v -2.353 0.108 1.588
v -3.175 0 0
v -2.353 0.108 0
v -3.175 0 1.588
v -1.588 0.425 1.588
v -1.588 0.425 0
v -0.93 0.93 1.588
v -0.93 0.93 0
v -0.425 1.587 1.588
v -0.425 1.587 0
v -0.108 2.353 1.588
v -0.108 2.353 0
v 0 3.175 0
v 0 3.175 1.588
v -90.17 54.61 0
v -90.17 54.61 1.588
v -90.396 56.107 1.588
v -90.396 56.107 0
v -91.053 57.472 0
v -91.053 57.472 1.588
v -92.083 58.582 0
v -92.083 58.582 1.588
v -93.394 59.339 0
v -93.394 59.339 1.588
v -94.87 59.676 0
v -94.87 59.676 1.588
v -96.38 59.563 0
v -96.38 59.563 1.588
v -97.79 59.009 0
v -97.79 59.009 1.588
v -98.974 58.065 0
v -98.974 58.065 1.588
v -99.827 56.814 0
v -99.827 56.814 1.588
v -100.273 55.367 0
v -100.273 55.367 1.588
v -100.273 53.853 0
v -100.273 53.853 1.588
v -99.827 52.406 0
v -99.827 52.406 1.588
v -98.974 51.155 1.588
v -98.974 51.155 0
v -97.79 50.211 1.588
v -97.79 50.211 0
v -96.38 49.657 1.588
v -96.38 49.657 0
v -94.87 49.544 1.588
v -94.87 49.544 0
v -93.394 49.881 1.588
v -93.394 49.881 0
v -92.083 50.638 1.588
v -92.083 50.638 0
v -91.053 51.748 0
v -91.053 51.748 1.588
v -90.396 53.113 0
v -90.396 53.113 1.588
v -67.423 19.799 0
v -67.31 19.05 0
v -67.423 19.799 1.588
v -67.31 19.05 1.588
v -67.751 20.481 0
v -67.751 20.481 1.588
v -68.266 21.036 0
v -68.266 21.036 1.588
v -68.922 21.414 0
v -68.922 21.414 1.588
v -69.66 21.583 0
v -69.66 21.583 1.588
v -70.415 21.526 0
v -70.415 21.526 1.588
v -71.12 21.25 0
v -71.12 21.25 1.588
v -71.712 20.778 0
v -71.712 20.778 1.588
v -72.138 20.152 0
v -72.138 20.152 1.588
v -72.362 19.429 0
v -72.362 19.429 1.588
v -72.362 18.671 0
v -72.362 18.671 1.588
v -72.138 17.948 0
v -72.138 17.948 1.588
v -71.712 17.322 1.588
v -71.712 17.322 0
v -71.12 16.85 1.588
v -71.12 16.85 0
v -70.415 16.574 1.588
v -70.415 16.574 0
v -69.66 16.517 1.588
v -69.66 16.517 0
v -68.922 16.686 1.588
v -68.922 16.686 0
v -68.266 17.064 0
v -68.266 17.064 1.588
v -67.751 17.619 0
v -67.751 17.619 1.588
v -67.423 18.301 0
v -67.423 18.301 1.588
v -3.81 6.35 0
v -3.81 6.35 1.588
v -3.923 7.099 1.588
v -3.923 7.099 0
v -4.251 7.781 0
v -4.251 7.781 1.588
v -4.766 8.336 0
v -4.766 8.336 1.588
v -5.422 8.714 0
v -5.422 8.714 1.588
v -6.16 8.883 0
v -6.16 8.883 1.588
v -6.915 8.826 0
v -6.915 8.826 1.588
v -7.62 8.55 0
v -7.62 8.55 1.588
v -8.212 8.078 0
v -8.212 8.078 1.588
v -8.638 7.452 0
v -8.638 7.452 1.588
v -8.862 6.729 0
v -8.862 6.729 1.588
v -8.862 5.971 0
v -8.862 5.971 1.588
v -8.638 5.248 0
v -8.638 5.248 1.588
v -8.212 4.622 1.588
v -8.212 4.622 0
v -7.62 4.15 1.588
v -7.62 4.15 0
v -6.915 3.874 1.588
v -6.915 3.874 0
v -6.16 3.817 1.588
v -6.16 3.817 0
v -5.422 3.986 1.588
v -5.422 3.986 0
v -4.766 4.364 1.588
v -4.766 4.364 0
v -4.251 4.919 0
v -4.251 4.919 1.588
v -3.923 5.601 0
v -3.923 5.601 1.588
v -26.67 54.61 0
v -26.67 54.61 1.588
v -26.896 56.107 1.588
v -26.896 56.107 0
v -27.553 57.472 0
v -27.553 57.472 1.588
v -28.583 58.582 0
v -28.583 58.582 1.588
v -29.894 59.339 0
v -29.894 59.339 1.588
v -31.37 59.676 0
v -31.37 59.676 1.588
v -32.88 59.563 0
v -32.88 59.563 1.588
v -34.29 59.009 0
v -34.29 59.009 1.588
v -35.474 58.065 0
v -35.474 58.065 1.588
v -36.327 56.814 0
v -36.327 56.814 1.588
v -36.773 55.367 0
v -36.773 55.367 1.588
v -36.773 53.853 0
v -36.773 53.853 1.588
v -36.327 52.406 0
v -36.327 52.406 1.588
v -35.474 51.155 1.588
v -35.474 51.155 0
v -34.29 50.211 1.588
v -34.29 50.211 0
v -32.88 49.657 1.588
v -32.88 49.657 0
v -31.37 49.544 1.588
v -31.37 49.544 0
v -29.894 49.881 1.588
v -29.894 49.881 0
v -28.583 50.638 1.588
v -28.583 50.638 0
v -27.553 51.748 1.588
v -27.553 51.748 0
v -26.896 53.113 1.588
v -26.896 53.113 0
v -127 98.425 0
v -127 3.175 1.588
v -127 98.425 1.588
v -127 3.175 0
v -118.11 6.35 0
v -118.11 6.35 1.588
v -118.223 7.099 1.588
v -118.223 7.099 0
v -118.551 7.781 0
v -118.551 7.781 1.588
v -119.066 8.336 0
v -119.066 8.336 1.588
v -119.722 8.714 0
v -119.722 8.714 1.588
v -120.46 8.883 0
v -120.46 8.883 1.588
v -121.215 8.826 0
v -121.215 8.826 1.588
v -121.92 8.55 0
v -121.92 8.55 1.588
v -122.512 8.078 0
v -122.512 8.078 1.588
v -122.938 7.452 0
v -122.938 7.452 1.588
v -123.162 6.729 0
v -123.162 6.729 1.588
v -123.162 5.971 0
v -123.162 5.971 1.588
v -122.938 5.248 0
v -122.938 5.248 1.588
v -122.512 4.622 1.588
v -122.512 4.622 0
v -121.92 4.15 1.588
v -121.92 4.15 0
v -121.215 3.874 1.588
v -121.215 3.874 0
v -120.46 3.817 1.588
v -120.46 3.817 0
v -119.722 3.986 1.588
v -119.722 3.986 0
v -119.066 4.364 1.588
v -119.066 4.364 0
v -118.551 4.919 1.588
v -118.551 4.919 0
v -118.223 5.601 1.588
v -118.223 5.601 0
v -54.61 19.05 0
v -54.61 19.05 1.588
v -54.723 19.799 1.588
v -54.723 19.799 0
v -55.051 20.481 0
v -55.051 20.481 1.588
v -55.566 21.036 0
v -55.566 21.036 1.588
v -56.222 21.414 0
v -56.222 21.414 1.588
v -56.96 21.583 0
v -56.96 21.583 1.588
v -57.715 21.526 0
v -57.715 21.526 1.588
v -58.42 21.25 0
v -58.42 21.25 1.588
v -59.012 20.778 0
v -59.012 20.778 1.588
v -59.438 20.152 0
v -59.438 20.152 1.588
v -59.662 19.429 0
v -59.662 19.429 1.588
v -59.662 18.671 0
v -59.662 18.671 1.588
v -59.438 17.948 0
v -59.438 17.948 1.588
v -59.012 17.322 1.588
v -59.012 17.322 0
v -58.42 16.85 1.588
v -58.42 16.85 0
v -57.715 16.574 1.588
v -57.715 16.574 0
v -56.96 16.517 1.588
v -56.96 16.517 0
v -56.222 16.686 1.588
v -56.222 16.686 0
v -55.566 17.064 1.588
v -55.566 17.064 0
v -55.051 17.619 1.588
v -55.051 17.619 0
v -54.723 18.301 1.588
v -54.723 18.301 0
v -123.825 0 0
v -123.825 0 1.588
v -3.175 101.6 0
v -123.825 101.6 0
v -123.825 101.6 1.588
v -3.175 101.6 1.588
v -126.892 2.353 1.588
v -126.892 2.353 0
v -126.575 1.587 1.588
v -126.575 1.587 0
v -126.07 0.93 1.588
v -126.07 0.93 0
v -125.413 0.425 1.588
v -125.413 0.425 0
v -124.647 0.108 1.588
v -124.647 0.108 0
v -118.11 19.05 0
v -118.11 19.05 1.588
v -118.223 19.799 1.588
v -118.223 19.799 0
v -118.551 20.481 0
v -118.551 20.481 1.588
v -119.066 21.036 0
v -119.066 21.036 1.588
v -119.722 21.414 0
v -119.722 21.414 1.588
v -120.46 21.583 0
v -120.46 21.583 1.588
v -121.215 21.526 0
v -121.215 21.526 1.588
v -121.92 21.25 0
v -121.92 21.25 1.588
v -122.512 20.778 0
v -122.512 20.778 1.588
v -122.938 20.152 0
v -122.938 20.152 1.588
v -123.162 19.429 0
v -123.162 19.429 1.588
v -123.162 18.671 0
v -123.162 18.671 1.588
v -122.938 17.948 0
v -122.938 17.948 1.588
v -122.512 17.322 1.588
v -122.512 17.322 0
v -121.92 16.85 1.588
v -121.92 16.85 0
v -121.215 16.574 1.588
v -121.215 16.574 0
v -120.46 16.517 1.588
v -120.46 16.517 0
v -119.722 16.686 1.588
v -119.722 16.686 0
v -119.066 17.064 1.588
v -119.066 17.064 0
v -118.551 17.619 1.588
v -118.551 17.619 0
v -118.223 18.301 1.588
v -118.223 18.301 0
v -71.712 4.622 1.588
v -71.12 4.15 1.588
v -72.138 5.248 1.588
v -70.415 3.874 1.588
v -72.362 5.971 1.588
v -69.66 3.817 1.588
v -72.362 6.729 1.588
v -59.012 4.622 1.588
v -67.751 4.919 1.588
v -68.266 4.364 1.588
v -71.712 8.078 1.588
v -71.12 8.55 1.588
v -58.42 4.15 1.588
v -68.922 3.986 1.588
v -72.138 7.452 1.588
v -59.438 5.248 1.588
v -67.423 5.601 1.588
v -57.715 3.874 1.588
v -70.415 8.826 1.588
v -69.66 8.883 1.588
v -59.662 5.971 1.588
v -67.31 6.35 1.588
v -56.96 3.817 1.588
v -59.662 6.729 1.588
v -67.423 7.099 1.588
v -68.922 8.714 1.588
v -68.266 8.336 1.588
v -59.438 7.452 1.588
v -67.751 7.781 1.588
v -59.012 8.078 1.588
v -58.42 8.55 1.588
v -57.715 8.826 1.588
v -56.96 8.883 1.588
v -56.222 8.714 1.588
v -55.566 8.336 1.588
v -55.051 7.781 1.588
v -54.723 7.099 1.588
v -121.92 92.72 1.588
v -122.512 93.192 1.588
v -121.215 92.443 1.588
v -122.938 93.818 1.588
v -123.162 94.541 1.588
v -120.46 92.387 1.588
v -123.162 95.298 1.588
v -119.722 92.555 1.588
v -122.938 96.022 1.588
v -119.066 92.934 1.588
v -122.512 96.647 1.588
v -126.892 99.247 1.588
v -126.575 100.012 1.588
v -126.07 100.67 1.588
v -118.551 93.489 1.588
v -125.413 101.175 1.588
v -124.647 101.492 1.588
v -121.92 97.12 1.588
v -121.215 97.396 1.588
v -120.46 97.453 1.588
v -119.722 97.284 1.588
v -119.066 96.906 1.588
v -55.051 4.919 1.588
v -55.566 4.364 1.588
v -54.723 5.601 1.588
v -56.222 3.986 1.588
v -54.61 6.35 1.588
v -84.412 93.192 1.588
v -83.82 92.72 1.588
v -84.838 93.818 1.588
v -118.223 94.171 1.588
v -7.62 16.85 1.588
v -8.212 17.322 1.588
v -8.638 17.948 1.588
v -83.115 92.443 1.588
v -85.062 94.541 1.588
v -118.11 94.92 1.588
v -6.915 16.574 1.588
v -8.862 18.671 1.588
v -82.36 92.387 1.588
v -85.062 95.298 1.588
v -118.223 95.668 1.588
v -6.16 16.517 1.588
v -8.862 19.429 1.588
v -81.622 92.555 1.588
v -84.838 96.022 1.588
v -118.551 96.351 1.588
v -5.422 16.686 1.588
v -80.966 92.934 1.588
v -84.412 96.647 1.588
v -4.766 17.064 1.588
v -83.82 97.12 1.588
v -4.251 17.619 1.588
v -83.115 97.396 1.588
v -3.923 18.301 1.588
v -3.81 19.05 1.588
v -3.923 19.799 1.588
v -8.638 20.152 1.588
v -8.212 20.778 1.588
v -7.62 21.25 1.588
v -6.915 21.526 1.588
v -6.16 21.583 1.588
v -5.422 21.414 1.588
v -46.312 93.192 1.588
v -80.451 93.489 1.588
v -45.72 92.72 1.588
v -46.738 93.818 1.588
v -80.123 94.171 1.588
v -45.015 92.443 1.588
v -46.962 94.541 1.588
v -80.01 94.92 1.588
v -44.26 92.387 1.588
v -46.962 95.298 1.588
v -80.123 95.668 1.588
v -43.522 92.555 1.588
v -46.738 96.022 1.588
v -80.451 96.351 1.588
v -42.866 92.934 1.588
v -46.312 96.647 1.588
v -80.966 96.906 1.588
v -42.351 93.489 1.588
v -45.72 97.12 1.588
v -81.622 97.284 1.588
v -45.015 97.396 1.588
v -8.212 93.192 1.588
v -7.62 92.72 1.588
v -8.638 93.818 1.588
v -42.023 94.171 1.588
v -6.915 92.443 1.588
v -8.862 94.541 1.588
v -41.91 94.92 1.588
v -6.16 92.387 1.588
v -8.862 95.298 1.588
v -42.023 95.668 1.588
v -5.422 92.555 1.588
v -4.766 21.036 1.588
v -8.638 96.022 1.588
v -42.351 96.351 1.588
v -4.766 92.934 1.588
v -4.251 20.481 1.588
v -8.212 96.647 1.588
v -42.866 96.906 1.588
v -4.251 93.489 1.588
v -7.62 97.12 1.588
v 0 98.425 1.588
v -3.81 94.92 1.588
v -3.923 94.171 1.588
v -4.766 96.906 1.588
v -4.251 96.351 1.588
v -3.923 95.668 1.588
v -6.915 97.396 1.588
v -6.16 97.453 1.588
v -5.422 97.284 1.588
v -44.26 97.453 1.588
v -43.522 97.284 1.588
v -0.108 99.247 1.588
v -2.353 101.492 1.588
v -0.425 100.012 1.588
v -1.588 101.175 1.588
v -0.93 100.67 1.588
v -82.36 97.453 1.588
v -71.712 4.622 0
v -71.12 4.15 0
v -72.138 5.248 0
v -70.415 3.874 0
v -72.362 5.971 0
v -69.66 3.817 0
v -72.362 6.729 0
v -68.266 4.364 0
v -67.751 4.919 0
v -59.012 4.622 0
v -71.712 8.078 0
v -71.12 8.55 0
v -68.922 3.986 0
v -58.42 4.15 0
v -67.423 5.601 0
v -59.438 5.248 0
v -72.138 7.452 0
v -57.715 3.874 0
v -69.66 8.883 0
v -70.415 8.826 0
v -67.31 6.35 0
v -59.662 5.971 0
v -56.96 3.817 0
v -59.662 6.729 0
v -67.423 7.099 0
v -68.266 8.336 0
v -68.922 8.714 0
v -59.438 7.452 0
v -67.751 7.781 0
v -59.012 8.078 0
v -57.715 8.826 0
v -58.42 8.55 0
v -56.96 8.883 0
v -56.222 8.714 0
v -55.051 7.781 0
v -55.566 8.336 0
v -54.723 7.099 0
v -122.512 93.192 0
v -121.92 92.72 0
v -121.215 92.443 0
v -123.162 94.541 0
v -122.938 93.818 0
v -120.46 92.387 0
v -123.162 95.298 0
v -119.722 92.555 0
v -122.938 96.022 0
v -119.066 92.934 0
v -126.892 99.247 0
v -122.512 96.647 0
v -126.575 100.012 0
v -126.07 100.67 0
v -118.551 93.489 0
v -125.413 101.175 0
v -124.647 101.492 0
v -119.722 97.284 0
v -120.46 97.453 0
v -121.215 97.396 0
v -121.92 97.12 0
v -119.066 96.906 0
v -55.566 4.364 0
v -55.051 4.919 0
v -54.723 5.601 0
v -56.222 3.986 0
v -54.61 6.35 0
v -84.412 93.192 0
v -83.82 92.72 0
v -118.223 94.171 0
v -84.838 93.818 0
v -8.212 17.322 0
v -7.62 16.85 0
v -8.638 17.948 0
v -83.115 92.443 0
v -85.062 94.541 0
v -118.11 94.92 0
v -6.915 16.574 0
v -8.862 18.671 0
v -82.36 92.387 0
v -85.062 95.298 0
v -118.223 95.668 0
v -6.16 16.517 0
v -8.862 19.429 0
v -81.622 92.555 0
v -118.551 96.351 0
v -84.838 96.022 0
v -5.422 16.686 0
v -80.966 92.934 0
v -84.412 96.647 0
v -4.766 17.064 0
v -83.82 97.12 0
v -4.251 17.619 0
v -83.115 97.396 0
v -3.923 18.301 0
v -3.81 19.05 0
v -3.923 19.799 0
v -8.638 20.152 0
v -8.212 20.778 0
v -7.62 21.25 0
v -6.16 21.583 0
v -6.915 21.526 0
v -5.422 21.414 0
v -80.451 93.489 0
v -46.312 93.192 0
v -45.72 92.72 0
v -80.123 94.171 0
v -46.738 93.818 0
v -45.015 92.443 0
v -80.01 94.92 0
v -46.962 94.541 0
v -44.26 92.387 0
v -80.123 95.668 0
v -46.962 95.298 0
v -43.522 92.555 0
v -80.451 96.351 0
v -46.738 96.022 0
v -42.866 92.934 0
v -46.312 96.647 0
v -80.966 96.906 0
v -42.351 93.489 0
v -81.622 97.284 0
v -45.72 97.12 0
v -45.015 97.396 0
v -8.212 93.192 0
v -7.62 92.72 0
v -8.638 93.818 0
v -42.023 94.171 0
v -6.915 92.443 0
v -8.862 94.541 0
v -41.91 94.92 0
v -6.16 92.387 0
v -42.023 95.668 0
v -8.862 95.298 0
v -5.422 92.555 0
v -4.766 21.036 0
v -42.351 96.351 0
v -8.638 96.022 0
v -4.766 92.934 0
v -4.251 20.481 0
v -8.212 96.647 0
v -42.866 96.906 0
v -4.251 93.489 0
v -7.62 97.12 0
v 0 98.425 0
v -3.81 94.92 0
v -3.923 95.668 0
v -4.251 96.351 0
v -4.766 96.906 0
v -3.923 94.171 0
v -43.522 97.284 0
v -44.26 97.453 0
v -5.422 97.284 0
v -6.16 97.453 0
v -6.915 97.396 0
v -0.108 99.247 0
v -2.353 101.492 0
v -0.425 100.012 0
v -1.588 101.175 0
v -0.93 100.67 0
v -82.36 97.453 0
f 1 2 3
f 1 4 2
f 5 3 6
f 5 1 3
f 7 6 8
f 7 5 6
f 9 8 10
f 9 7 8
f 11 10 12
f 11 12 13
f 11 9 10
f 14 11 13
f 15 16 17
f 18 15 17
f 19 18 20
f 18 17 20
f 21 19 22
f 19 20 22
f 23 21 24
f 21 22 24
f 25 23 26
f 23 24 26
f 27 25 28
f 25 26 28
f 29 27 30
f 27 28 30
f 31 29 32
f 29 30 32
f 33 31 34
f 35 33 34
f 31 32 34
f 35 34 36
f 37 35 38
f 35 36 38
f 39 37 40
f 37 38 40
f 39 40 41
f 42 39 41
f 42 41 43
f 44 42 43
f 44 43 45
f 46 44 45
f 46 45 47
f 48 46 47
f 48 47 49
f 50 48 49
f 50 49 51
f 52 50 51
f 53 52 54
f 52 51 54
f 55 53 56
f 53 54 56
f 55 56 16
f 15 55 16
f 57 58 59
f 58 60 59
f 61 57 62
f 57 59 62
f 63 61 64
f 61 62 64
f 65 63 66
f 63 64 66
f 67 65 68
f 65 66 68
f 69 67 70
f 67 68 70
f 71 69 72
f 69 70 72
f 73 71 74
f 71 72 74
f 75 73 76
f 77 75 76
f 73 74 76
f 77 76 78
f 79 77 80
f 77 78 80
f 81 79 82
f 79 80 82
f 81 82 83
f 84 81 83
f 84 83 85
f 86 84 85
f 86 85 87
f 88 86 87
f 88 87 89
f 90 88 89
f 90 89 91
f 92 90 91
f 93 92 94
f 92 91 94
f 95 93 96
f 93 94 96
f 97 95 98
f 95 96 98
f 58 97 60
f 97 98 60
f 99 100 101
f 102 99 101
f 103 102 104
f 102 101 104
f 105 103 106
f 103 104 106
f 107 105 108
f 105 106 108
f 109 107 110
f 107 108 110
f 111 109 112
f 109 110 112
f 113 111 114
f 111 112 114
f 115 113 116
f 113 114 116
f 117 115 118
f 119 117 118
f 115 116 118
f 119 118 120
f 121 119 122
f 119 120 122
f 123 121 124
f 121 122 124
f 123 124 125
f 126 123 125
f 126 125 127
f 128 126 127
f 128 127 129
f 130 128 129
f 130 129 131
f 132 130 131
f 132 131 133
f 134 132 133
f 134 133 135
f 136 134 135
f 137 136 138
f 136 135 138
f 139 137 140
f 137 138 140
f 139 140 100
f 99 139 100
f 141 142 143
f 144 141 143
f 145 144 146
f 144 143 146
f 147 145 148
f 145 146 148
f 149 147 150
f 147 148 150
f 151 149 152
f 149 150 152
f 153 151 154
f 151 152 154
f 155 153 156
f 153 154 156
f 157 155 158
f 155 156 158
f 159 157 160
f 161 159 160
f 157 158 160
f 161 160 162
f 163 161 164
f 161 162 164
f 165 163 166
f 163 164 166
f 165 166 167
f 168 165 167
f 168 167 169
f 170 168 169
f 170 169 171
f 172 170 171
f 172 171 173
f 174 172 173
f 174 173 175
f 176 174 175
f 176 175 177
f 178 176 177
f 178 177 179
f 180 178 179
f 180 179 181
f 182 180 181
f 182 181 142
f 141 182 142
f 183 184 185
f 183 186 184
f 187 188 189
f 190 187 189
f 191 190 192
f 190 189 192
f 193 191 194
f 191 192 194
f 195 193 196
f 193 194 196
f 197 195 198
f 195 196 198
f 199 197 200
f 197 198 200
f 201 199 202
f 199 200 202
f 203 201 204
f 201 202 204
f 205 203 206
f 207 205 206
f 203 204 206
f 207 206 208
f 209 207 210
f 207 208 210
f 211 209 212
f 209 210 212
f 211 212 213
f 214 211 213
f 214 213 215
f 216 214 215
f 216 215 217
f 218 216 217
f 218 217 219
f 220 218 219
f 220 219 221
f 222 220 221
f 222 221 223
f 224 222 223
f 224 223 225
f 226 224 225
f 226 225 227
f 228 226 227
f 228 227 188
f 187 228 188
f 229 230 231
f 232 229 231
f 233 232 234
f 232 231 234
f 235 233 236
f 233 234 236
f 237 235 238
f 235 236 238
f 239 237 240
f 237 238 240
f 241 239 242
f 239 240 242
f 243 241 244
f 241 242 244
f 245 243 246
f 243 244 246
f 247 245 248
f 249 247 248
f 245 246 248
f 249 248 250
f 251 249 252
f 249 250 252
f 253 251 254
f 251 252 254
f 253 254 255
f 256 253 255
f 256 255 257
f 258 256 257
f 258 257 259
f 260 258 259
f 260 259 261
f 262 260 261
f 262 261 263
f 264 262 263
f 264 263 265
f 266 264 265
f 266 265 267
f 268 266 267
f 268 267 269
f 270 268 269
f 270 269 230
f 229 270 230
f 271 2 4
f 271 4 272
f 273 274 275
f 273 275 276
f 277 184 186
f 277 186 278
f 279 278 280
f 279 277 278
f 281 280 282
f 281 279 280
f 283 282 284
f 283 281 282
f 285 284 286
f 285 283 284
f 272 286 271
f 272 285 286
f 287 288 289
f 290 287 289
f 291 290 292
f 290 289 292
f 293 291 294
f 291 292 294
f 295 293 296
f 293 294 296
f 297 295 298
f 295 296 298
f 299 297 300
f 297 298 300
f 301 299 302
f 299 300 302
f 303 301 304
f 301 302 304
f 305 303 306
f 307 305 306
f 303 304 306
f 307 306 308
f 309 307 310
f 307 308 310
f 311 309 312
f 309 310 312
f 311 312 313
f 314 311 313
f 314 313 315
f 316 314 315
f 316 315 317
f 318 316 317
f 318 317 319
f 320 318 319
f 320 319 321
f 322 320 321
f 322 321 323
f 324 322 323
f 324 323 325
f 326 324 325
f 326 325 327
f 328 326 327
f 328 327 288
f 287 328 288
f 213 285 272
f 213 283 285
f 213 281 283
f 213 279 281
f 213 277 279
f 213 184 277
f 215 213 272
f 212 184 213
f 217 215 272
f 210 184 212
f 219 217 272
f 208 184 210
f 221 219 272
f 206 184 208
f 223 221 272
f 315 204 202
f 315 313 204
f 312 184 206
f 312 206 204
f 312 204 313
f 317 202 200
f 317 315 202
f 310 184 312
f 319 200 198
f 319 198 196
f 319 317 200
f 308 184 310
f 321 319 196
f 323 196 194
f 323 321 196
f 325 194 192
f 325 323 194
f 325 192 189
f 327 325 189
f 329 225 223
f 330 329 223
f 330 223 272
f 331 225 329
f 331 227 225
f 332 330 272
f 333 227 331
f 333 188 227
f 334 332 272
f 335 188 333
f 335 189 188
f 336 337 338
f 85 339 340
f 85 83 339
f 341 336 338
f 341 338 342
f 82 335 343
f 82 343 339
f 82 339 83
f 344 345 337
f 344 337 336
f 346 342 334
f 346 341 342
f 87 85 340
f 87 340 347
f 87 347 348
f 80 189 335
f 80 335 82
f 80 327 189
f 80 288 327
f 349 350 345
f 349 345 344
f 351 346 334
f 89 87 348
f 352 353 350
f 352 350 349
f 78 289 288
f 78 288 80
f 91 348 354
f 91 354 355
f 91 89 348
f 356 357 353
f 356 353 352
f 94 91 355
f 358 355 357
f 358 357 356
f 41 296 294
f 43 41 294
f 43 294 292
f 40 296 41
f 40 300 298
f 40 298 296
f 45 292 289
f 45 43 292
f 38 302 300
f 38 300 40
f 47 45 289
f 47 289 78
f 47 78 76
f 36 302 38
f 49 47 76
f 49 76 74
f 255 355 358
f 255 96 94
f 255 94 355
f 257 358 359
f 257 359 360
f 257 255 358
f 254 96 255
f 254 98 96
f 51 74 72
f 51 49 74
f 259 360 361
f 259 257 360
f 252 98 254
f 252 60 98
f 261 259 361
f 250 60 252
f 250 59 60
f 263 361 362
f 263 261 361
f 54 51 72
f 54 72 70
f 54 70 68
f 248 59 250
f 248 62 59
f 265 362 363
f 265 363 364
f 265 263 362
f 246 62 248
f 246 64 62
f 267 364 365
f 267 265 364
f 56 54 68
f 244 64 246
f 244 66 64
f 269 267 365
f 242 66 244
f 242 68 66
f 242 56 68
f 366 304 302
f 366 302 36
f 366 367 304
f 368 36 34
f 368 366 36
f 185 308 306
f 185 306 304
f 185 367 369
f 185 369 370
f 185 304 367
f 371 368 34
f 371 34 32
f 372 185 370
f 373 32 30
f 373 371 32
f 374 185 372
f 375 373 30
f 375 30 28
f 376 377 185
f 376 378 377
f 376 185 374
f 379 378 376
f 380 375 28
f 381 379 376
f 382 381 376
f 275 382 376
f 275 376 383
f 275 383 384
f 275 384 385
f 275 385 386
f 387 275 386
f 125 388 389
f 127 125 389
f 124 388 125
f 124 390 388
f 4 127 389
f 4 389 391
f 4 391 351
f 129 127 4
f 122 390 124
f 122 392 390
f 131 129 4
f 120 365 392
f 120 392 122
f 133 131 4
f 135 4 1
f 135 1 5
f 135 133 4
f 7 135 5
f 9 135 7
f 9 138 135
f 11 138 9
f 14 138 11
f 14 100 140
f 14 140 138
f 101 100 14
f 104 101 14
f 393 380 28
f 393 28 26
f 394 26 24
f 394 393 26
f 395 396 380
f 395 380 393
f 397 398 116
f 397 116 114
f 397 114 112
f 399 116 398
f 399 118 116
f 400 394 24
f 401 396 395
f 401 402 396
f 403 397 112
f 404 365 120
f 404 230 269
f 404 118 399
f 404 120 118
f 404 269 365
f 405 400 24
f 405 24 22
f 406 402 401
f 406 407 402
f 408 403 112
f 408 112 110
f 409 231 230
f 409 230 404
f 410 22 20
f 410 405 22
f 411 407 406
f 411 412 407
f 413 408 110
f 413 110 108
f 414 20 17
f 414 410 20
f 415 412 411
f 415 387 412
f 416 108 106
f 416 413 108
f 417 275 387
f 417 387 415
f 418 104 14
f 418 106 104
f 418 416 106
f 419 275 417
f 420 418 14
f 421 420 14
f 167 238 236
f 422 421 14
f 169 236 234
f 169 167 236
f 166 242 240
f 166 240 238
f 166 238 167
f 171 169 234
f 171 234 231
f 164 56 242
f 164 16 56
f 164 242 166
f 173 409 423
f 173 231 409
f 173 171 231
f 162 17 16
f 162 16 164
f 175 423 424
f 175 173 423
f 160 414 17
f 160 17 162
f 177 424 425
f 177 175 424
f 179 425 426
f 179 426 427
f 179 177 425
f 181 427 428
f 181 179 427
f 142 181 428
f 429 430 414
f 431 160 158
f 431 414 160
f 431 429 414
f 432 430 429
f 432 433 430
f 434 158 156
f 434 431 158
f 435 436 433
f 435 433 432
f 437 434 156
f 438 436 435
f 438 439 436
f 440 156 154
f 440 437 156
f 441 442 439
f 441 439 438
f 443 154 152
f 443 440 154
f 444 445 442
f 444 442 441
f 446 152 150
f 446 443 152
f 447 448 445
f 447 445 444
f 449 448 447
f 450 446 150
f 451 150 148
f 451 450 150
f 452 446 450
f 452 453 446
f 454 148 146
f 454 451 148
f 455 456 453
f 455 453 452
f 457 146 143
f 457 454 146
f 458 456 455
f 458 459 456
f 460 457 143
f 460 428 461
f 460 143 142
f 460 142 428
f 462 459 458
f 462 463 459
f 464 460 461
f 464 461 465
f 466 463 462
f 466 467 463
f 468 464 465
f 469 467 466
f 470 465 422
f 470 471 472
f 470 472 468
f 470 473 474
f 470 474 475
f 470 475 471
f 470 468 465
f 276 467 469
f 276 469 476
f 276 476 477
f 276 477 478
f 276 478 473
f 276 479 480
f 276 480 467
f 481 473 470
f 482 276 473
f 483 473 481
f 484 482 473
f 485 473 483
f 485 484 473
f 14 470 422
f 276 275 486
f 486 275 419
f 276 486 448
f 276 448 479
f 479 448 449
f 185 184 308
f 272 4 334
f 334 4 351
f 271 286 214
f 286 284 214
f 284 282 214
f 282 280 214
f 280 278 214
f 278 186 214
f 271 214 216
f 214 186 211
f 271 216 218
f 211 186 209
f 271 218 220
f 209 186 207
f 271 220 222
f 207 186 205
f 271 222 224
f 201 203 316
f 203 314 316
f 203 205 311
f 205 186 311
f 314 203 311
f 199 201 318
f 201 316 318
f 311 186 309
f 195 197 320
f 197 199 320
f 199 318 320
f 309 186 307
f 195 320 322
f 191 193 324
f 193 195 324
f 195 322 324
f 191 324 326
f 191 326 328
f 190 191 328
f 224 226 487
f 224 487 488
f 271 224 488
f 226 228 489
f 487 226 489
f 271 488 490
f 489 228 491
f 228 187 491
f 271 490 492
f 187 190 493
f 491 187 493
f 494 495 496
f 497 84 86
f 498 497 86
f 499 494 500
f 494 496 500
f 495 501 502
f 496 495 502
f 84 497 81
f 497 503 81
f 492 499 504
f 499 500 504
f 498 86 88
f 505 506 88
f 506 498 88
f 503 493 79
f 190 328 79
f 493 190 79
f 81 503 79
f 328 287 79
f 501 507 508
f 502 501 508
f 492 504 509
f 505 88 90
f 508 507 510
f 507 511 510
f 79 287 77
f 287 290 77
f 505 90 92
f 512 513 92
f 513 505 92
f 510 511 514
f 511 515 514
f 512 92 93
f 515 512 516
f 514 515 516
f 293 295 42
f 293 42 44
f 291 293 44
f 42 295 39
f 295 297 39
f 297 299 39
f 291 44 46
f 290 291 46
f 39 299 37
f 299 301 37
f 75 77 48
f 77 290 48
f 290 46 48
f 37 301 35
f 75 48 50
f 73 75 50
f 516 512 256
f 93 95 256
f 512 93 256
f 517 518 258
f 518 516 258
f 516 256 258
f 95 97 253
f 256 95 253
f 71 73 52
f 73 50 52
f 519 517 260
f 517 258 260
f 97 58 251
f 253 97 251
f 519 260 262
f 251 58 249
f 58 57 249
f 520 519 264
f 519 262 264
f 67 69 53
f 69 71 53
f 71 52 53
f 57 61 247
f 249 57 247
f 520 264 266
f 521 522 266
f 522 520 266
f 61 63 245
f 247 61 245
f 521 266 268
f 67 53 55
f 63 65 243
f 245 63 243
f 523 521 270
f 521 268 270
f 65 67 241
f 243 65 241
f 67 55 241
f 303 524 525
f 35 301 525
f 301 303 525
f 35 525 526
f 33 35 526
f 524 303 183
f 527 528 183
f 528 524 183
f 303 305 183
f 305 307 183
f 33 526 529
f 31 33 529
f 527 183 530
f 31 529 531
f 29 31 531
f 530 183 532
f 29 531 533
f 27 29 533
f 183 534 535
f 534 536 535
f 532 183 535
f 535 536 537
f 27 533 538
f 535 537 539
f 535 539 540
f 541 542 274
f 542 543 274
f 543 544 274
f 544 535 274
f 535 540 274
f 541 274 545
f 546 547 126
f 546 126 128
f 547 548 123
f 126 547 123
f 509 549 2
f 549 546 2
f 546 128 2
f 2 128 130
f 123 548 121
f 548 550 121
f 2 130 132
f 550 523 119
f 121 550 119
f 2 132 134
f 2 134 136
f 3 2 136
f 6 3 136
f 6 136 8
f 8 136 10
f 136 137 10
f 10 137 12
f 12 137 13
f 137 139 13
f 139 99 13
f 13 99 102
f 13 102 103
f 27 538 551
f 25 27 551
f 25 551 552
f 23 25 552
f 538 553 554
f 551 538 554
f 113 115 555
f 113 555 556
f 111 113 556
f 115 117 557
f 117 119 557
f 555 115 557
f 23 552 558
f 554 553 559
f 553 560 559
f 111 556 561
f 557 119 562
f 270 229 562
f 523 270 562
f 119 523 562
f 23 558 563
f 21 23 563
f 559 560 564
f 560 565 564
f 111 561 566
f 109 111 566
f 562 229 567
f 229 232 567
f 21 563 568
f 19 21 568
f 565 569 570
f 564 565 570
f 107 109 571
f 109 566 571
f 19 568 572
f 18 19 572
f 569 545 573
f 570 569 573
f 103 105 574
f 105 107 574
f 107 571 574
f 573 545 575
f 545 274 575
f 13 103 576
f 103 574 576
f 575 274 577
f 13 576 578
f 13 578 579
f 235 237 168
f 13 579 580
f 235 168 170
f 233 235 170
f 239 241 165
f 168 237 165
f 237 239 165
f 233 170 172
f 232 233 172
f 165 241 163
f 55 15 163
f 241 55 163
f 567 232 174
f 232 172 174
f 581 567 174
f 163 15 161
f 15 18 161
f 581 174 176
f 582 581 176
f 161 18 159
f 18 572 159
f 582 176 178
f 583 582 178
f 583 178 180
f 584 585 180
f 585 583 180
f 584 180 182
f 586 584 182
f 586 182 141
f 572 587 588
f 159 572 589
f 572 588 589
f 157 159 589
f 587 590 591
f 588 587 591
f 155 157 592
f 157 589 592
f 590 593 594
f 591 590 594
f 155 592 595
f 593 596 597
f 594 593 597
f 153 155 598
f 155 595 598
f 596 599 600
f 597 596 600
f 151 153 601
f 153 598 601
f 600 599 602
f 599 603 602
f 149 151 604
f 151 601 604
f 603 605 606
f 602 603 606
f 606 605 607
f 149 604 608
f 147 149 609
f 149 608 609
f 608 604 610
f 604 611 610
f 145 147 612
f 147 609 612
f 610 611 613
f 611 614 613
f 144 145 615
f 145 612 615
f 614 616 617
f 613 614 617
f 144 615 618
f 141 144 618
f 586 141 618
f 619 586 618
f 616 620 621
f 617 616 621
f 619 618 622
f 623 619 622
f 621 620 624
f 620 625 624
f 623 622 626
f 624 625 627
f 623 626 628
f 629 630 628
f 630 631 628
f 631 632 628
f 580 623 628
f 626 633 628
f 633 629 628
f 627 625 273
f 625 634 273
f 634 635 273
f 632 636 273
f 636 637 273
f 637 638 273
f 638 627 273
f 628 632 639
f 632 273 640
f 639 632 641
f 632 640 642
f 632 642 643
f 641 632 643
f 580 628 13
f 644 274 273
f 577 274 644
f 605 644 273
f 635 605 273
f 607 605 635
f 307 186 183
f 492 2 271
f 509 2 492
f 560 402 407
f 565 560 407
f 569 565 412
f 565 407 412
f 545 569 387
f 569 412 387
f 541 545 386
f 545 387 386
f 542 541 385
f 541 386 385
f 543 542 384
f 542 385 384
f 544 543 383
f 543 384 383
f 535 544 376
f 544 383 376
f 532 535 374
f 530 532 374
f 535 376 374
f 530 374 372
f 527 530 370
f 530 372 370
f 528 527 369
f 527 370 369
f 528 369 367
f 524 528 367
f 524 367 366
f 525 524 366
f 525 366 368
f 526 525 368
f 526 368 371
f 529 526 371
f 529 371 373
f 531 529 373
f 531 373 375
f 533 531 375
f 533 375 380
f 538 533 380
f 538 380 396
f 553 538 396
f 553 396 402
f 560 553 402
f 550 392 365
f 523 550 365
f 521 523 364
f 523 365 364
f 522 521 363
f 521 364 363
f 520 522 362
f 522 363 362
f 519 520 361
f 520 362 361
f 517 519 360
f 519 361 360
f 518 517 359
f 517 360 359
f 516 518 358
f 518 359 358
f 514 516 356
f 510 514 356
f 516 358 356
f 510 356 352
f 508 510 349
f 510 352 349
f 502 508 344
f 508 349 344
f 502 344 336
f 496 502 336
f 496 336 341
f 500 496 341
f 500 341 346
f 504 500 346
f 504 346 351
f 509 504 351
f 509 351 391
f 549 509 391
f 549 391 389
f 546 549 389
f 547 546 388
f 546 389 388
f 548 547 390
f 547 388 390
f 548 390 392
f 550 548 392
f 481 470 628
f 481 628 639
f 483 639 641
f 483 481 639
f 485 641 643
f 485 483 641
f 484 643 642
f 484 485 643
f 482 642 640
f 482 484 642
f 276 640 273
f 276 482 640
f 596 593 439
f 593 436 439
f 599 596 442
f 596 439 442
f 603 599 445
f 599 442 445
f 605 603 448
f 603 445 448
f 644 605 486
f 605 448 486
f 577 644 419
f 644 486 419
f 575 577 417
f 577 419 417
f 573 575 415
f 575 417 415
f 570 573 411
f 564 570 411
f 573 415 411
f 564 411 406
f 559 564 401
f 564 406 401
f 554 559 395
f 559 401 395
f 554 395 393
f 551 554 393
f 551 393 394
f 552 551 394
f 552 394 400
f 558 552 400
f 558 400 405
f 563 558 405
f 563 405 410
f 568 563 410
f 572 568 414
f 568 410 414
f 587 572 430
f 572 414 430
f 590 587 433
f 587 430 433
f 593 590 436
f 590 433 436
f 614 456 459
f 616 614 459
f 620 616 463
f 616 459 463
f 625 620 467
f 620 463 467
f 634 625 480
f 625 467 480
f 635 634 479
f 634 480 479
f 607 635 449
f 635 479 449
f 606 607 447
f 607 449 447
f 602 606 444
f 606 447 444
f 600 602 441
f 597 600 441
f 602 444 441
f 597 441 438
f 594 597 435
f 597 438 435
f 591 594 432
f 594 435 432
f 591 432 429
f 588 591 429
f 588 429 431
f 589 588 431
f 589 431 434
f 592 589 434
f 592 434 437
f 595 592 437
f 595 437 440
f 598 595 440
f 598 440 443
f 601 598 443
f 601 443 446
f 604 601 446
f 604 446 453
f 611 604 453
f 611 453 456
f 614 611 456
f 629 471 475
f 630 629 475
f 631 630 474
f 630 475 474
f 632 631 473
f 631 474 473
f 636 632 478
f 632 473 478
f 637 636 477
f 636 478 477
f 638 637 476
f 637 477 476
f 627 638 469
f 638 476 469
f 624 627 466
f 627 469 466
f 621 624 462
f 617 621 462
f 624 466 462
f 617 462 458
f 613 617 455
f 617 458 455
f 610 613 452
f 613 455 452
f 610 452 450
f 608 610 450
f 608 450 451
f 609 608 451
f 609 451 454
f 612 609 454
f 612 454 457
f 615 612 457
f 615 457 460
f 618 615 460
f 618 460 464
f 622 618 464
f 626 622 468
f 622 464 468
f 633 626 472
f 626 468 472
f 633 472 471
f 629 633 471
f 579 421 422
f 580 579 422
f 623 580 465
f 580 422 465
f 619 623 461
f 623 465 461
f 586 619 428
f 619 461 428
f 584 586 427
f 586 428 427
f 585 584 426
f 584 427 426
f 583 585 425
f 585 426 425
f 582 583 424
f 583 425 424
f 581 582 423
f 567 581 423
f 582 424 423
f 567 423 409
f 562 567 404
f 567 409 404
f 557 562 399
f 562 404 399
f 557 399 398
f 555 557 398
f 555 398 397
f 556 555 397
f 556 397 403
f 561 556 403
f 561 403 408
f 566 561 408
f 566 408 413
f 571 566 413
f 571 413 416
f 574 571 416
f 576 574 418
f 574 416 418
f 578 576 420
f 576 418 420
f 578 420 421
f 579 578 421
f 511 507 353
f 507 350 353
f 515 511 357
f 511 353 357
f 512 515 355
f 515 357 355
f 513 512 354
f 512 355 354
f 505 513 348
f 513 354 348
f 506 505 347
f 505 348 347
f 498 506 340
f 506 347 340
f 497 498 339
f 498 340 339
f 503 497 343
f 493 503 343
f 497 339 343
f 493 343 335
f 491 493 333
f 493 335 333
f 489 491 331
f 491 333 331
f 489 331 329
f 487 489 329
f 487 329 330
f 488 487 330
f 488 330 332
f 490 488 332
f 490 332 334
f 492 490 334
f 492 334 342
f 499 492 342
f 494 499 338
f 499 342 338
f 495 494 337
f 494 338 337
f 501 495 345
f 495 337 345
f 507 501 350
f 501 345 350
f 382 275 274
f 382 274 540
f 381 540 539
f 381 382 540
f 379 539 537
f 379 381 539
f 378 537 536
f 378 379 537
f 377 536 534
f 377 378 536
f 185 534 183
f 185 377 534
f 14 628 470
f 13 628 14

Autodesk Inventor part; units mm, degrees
ref_plane "YZ Plane" through (0, 0, 0) normal (1, 0, 0) x (0, 1, 0)
ref_plane "XZ Plane" through (0, 0, 0) normal (0, 1, 0) x (-1, 0, 0)
ref_plane "XY Plane" through (0, 0, 0) normal (0, 0, 1) x (1, 0, 0)
sketch "Sketch1" plane through (0, 0, 0) normal (0, 0, 1) x (1, 0, 0)
  line L0 (0, 0) -> (-127, 0)
  line L1 (-127, 0) -> (-127, 101.6)
  line L2 (-127, 101.6) -> (0, 101.6)
  line L3 (0, 101.6) -> (0, 0)
  dimension "d0" = 127
  dimension "d1" = 101.6
extrude "Extrusion1" add sketch "Sketch1" along normal blind 1.5875
sketch "Sketch3" plane through (0, 0, 1.5875) normal (0, 0, 1) x (1, 0, 0)
  line L0 (0, 101.6) -> (-127, 101.6) projected
  line L1 (-6.35, 101.6) -> (-6.35, 95.25)
  line L2 (-6.35, 95.25) -> (0, 95.25)
  line L3 (0, 0) -> (0, 101.6) projected
  line L4 (-6.35, 95.25) -> (-44.45, 95.25)
  line L5 (-44.45, 95.25) -> (-82.55, 95.25)
  line L6 (-82.55, 95.25) -> (-120.65, 95.25)
  line L7 (-120.65, 95.25) -> (-127, 95.25)
  line L8 (-120.65, 95.25) -> (-120.65, 19.05)
  line L9 (-120.65, 19.05) -> (-120.65, 6.35)
  circle A0 centre (-120.65, 19.05) radius 2.54
  circle A1 centre (-120.65, 6.35) radius 2.54
  line L10 (-6.35, 95.25) -> (-6.35, 19.05)
  circle A2 centre (-6.35, 19.05) radius 2.54
  line L11 (-6.35, 19.05) -> (-6.35, 6.35)
  circle A3 centre (-6.35, 6.35) radius 2.54
  line L12 (-6.35, 6.35) -> (-57.15, 6.35)
  circle A4 centre (-57.15, 6.35) radius 2.54
  line L13 (-57.15, 6.35) -> (-69.85, 6.35)
  circle A5 centre (-69.85, 6.35) radius 2.54
  line L14 (-69.85, 6.35) -> (-120.65, 6.35)
  line L15 (-69.85, 6.35) -> (-69.85, 19.05)
  line L16 (-57.15, 6.35) -> (-57.15, 19.05)
  circle A6 centre (-69.85, 19.05) radius 2.54
  circle A7 centre (-57.15, 19.05) radius 2.54
  line L17 (-120.65, 95.25) -> (-107.9525, 95.25)
  line L18 (-101.6, 95.25) -> (-95.25, 95.25)
  line L19 (-95.25, 95.25) -> (-95.25, 54.61)
  circle A8 centre (-95.25, 54.61) radius 5.08
  line L20 (-25.4, 95.25) -> (-31.75, 95.25)
  line L21 (-44.45, 95.25) -> (-31.75, 95.25)
  line L22 (-31.75, 95.25) -> (-31.75, 54.61)
  circle A9 centre (-31.75, 54.61) radius 5.08
  line L23 (-120.65, 95.25) -> (-120.65, 97.79)
  line L24 (-6.35, 95.25) -> (-6.35, 97.79)
  line L25 (-82.55, 95.25) -> (-82.55, 97.79)
  line L26 (-44.45, 95.25) -> (-44.45, 97.79)
  line L27 (-120.65, 97.79) -> (-120.65, 96.52)
  line L28 (-82.55, 97.79) -> (-82.55, 96.52)
  line L29 (-44.45, 97.79) -> (-44.45, 96.52)
  line L30 (-6.35, 97.79) -> (-6.35, 96.52)
  line L31 (-120.65, 96.52) -> (-120.65, 94.9198)
  circle A10 centre (-120.65, 94.9198) radius 2.54
  line L32 (-82.55, 96.52) -> (-82.55, 94.9198)
  circle A11 centre (-82.55, 94.9198) radius 2.54
  line L33 (-44.45, 96.52) -> (-44.45, 94.9198)
  line L34 (-6.35, 96.52) -> (-6.35, 94.9198)
  circle A12 centre (-6.35, 94.9198) radius 2.54
  circle A13 centre (-44.45, 94.9198) radius 2.54
  dimension "d4" = 6.35
  dimension "d5" = 6.35
  dimension "d7" = 38.1
  dimension "d8" = 38.1
  dimension "d9" = 38.1
  dimension "d10" = 6.35
  dimension "d20" = 76.2
  dimension "d21" = 12.7
  dimension "d22" = 5.08
  dimension "d23" = 5.08
  dimension "d26" = 76.2
  dimension "d27" = 5.08
  dimension "d28" = 12.7
  dimension "d29" = 5.08
  dimension "d33" = 50.8
  dimension "d34" = 5.08
  dimension "d35" = 12.7
  dimension "d36" = 5.08
  dimension "d37" = 12.7
  dimension "d38" = 5.08
  dimension "d39" = 5.08
  dimension "d41" = 10.16
  dimension "d42" = 10.16
  dimension "d43" = 40.64
  dimension "d44" = 40.64
  dimension "d53" = 1.6002
  dimension "d54" = 5.08
  dimension "d55" = 1.6002
  dimension "d56" = 5.08
  dimension "d57" = 1.6002
  dimension "d58" = 1.6002
  dimension "d59" = 5.08
  dimension "d60" = 5.08
extrude "Extrusion2" cut sketch "Sketch3" against normal blind 25.4 contours A12 L10 L2 | L2 L1 A12 | L1 L4 A12 | L10 A12 L4 | A9 | A8 | A6 | A7 | A2 L11 L10 | L10 L11 A2 | A13 L5 L4 | L4 L26 A13 | A3 L12 L11 | L11 L12 A3 | L5 A13 L26 | A4 L13 L12 | L12 L16 A4 | A11 L6 L5 | L5 L25 A11 | L13 A4 L16 | L6 A11 L25 | A5 L14 L13 | L13 L15 A5 | L14 A5 L15 | L14 L9 A1 | A1 L9 L14 | A0 L8 L9 | L9 L8 A0 | A10 L8 L6 | L6 L23 A10 | L8 A10 L7 | L7 A10 L23
fillet "Fillet1" radius 3.175 4 edges at (-127, 101.6, 0.7937) (0, 101.6, 0.7937) (0, 0, 0.7937) (-127, 0, 0.7937)
properties part number "Polycarbonate Kicker plate"
